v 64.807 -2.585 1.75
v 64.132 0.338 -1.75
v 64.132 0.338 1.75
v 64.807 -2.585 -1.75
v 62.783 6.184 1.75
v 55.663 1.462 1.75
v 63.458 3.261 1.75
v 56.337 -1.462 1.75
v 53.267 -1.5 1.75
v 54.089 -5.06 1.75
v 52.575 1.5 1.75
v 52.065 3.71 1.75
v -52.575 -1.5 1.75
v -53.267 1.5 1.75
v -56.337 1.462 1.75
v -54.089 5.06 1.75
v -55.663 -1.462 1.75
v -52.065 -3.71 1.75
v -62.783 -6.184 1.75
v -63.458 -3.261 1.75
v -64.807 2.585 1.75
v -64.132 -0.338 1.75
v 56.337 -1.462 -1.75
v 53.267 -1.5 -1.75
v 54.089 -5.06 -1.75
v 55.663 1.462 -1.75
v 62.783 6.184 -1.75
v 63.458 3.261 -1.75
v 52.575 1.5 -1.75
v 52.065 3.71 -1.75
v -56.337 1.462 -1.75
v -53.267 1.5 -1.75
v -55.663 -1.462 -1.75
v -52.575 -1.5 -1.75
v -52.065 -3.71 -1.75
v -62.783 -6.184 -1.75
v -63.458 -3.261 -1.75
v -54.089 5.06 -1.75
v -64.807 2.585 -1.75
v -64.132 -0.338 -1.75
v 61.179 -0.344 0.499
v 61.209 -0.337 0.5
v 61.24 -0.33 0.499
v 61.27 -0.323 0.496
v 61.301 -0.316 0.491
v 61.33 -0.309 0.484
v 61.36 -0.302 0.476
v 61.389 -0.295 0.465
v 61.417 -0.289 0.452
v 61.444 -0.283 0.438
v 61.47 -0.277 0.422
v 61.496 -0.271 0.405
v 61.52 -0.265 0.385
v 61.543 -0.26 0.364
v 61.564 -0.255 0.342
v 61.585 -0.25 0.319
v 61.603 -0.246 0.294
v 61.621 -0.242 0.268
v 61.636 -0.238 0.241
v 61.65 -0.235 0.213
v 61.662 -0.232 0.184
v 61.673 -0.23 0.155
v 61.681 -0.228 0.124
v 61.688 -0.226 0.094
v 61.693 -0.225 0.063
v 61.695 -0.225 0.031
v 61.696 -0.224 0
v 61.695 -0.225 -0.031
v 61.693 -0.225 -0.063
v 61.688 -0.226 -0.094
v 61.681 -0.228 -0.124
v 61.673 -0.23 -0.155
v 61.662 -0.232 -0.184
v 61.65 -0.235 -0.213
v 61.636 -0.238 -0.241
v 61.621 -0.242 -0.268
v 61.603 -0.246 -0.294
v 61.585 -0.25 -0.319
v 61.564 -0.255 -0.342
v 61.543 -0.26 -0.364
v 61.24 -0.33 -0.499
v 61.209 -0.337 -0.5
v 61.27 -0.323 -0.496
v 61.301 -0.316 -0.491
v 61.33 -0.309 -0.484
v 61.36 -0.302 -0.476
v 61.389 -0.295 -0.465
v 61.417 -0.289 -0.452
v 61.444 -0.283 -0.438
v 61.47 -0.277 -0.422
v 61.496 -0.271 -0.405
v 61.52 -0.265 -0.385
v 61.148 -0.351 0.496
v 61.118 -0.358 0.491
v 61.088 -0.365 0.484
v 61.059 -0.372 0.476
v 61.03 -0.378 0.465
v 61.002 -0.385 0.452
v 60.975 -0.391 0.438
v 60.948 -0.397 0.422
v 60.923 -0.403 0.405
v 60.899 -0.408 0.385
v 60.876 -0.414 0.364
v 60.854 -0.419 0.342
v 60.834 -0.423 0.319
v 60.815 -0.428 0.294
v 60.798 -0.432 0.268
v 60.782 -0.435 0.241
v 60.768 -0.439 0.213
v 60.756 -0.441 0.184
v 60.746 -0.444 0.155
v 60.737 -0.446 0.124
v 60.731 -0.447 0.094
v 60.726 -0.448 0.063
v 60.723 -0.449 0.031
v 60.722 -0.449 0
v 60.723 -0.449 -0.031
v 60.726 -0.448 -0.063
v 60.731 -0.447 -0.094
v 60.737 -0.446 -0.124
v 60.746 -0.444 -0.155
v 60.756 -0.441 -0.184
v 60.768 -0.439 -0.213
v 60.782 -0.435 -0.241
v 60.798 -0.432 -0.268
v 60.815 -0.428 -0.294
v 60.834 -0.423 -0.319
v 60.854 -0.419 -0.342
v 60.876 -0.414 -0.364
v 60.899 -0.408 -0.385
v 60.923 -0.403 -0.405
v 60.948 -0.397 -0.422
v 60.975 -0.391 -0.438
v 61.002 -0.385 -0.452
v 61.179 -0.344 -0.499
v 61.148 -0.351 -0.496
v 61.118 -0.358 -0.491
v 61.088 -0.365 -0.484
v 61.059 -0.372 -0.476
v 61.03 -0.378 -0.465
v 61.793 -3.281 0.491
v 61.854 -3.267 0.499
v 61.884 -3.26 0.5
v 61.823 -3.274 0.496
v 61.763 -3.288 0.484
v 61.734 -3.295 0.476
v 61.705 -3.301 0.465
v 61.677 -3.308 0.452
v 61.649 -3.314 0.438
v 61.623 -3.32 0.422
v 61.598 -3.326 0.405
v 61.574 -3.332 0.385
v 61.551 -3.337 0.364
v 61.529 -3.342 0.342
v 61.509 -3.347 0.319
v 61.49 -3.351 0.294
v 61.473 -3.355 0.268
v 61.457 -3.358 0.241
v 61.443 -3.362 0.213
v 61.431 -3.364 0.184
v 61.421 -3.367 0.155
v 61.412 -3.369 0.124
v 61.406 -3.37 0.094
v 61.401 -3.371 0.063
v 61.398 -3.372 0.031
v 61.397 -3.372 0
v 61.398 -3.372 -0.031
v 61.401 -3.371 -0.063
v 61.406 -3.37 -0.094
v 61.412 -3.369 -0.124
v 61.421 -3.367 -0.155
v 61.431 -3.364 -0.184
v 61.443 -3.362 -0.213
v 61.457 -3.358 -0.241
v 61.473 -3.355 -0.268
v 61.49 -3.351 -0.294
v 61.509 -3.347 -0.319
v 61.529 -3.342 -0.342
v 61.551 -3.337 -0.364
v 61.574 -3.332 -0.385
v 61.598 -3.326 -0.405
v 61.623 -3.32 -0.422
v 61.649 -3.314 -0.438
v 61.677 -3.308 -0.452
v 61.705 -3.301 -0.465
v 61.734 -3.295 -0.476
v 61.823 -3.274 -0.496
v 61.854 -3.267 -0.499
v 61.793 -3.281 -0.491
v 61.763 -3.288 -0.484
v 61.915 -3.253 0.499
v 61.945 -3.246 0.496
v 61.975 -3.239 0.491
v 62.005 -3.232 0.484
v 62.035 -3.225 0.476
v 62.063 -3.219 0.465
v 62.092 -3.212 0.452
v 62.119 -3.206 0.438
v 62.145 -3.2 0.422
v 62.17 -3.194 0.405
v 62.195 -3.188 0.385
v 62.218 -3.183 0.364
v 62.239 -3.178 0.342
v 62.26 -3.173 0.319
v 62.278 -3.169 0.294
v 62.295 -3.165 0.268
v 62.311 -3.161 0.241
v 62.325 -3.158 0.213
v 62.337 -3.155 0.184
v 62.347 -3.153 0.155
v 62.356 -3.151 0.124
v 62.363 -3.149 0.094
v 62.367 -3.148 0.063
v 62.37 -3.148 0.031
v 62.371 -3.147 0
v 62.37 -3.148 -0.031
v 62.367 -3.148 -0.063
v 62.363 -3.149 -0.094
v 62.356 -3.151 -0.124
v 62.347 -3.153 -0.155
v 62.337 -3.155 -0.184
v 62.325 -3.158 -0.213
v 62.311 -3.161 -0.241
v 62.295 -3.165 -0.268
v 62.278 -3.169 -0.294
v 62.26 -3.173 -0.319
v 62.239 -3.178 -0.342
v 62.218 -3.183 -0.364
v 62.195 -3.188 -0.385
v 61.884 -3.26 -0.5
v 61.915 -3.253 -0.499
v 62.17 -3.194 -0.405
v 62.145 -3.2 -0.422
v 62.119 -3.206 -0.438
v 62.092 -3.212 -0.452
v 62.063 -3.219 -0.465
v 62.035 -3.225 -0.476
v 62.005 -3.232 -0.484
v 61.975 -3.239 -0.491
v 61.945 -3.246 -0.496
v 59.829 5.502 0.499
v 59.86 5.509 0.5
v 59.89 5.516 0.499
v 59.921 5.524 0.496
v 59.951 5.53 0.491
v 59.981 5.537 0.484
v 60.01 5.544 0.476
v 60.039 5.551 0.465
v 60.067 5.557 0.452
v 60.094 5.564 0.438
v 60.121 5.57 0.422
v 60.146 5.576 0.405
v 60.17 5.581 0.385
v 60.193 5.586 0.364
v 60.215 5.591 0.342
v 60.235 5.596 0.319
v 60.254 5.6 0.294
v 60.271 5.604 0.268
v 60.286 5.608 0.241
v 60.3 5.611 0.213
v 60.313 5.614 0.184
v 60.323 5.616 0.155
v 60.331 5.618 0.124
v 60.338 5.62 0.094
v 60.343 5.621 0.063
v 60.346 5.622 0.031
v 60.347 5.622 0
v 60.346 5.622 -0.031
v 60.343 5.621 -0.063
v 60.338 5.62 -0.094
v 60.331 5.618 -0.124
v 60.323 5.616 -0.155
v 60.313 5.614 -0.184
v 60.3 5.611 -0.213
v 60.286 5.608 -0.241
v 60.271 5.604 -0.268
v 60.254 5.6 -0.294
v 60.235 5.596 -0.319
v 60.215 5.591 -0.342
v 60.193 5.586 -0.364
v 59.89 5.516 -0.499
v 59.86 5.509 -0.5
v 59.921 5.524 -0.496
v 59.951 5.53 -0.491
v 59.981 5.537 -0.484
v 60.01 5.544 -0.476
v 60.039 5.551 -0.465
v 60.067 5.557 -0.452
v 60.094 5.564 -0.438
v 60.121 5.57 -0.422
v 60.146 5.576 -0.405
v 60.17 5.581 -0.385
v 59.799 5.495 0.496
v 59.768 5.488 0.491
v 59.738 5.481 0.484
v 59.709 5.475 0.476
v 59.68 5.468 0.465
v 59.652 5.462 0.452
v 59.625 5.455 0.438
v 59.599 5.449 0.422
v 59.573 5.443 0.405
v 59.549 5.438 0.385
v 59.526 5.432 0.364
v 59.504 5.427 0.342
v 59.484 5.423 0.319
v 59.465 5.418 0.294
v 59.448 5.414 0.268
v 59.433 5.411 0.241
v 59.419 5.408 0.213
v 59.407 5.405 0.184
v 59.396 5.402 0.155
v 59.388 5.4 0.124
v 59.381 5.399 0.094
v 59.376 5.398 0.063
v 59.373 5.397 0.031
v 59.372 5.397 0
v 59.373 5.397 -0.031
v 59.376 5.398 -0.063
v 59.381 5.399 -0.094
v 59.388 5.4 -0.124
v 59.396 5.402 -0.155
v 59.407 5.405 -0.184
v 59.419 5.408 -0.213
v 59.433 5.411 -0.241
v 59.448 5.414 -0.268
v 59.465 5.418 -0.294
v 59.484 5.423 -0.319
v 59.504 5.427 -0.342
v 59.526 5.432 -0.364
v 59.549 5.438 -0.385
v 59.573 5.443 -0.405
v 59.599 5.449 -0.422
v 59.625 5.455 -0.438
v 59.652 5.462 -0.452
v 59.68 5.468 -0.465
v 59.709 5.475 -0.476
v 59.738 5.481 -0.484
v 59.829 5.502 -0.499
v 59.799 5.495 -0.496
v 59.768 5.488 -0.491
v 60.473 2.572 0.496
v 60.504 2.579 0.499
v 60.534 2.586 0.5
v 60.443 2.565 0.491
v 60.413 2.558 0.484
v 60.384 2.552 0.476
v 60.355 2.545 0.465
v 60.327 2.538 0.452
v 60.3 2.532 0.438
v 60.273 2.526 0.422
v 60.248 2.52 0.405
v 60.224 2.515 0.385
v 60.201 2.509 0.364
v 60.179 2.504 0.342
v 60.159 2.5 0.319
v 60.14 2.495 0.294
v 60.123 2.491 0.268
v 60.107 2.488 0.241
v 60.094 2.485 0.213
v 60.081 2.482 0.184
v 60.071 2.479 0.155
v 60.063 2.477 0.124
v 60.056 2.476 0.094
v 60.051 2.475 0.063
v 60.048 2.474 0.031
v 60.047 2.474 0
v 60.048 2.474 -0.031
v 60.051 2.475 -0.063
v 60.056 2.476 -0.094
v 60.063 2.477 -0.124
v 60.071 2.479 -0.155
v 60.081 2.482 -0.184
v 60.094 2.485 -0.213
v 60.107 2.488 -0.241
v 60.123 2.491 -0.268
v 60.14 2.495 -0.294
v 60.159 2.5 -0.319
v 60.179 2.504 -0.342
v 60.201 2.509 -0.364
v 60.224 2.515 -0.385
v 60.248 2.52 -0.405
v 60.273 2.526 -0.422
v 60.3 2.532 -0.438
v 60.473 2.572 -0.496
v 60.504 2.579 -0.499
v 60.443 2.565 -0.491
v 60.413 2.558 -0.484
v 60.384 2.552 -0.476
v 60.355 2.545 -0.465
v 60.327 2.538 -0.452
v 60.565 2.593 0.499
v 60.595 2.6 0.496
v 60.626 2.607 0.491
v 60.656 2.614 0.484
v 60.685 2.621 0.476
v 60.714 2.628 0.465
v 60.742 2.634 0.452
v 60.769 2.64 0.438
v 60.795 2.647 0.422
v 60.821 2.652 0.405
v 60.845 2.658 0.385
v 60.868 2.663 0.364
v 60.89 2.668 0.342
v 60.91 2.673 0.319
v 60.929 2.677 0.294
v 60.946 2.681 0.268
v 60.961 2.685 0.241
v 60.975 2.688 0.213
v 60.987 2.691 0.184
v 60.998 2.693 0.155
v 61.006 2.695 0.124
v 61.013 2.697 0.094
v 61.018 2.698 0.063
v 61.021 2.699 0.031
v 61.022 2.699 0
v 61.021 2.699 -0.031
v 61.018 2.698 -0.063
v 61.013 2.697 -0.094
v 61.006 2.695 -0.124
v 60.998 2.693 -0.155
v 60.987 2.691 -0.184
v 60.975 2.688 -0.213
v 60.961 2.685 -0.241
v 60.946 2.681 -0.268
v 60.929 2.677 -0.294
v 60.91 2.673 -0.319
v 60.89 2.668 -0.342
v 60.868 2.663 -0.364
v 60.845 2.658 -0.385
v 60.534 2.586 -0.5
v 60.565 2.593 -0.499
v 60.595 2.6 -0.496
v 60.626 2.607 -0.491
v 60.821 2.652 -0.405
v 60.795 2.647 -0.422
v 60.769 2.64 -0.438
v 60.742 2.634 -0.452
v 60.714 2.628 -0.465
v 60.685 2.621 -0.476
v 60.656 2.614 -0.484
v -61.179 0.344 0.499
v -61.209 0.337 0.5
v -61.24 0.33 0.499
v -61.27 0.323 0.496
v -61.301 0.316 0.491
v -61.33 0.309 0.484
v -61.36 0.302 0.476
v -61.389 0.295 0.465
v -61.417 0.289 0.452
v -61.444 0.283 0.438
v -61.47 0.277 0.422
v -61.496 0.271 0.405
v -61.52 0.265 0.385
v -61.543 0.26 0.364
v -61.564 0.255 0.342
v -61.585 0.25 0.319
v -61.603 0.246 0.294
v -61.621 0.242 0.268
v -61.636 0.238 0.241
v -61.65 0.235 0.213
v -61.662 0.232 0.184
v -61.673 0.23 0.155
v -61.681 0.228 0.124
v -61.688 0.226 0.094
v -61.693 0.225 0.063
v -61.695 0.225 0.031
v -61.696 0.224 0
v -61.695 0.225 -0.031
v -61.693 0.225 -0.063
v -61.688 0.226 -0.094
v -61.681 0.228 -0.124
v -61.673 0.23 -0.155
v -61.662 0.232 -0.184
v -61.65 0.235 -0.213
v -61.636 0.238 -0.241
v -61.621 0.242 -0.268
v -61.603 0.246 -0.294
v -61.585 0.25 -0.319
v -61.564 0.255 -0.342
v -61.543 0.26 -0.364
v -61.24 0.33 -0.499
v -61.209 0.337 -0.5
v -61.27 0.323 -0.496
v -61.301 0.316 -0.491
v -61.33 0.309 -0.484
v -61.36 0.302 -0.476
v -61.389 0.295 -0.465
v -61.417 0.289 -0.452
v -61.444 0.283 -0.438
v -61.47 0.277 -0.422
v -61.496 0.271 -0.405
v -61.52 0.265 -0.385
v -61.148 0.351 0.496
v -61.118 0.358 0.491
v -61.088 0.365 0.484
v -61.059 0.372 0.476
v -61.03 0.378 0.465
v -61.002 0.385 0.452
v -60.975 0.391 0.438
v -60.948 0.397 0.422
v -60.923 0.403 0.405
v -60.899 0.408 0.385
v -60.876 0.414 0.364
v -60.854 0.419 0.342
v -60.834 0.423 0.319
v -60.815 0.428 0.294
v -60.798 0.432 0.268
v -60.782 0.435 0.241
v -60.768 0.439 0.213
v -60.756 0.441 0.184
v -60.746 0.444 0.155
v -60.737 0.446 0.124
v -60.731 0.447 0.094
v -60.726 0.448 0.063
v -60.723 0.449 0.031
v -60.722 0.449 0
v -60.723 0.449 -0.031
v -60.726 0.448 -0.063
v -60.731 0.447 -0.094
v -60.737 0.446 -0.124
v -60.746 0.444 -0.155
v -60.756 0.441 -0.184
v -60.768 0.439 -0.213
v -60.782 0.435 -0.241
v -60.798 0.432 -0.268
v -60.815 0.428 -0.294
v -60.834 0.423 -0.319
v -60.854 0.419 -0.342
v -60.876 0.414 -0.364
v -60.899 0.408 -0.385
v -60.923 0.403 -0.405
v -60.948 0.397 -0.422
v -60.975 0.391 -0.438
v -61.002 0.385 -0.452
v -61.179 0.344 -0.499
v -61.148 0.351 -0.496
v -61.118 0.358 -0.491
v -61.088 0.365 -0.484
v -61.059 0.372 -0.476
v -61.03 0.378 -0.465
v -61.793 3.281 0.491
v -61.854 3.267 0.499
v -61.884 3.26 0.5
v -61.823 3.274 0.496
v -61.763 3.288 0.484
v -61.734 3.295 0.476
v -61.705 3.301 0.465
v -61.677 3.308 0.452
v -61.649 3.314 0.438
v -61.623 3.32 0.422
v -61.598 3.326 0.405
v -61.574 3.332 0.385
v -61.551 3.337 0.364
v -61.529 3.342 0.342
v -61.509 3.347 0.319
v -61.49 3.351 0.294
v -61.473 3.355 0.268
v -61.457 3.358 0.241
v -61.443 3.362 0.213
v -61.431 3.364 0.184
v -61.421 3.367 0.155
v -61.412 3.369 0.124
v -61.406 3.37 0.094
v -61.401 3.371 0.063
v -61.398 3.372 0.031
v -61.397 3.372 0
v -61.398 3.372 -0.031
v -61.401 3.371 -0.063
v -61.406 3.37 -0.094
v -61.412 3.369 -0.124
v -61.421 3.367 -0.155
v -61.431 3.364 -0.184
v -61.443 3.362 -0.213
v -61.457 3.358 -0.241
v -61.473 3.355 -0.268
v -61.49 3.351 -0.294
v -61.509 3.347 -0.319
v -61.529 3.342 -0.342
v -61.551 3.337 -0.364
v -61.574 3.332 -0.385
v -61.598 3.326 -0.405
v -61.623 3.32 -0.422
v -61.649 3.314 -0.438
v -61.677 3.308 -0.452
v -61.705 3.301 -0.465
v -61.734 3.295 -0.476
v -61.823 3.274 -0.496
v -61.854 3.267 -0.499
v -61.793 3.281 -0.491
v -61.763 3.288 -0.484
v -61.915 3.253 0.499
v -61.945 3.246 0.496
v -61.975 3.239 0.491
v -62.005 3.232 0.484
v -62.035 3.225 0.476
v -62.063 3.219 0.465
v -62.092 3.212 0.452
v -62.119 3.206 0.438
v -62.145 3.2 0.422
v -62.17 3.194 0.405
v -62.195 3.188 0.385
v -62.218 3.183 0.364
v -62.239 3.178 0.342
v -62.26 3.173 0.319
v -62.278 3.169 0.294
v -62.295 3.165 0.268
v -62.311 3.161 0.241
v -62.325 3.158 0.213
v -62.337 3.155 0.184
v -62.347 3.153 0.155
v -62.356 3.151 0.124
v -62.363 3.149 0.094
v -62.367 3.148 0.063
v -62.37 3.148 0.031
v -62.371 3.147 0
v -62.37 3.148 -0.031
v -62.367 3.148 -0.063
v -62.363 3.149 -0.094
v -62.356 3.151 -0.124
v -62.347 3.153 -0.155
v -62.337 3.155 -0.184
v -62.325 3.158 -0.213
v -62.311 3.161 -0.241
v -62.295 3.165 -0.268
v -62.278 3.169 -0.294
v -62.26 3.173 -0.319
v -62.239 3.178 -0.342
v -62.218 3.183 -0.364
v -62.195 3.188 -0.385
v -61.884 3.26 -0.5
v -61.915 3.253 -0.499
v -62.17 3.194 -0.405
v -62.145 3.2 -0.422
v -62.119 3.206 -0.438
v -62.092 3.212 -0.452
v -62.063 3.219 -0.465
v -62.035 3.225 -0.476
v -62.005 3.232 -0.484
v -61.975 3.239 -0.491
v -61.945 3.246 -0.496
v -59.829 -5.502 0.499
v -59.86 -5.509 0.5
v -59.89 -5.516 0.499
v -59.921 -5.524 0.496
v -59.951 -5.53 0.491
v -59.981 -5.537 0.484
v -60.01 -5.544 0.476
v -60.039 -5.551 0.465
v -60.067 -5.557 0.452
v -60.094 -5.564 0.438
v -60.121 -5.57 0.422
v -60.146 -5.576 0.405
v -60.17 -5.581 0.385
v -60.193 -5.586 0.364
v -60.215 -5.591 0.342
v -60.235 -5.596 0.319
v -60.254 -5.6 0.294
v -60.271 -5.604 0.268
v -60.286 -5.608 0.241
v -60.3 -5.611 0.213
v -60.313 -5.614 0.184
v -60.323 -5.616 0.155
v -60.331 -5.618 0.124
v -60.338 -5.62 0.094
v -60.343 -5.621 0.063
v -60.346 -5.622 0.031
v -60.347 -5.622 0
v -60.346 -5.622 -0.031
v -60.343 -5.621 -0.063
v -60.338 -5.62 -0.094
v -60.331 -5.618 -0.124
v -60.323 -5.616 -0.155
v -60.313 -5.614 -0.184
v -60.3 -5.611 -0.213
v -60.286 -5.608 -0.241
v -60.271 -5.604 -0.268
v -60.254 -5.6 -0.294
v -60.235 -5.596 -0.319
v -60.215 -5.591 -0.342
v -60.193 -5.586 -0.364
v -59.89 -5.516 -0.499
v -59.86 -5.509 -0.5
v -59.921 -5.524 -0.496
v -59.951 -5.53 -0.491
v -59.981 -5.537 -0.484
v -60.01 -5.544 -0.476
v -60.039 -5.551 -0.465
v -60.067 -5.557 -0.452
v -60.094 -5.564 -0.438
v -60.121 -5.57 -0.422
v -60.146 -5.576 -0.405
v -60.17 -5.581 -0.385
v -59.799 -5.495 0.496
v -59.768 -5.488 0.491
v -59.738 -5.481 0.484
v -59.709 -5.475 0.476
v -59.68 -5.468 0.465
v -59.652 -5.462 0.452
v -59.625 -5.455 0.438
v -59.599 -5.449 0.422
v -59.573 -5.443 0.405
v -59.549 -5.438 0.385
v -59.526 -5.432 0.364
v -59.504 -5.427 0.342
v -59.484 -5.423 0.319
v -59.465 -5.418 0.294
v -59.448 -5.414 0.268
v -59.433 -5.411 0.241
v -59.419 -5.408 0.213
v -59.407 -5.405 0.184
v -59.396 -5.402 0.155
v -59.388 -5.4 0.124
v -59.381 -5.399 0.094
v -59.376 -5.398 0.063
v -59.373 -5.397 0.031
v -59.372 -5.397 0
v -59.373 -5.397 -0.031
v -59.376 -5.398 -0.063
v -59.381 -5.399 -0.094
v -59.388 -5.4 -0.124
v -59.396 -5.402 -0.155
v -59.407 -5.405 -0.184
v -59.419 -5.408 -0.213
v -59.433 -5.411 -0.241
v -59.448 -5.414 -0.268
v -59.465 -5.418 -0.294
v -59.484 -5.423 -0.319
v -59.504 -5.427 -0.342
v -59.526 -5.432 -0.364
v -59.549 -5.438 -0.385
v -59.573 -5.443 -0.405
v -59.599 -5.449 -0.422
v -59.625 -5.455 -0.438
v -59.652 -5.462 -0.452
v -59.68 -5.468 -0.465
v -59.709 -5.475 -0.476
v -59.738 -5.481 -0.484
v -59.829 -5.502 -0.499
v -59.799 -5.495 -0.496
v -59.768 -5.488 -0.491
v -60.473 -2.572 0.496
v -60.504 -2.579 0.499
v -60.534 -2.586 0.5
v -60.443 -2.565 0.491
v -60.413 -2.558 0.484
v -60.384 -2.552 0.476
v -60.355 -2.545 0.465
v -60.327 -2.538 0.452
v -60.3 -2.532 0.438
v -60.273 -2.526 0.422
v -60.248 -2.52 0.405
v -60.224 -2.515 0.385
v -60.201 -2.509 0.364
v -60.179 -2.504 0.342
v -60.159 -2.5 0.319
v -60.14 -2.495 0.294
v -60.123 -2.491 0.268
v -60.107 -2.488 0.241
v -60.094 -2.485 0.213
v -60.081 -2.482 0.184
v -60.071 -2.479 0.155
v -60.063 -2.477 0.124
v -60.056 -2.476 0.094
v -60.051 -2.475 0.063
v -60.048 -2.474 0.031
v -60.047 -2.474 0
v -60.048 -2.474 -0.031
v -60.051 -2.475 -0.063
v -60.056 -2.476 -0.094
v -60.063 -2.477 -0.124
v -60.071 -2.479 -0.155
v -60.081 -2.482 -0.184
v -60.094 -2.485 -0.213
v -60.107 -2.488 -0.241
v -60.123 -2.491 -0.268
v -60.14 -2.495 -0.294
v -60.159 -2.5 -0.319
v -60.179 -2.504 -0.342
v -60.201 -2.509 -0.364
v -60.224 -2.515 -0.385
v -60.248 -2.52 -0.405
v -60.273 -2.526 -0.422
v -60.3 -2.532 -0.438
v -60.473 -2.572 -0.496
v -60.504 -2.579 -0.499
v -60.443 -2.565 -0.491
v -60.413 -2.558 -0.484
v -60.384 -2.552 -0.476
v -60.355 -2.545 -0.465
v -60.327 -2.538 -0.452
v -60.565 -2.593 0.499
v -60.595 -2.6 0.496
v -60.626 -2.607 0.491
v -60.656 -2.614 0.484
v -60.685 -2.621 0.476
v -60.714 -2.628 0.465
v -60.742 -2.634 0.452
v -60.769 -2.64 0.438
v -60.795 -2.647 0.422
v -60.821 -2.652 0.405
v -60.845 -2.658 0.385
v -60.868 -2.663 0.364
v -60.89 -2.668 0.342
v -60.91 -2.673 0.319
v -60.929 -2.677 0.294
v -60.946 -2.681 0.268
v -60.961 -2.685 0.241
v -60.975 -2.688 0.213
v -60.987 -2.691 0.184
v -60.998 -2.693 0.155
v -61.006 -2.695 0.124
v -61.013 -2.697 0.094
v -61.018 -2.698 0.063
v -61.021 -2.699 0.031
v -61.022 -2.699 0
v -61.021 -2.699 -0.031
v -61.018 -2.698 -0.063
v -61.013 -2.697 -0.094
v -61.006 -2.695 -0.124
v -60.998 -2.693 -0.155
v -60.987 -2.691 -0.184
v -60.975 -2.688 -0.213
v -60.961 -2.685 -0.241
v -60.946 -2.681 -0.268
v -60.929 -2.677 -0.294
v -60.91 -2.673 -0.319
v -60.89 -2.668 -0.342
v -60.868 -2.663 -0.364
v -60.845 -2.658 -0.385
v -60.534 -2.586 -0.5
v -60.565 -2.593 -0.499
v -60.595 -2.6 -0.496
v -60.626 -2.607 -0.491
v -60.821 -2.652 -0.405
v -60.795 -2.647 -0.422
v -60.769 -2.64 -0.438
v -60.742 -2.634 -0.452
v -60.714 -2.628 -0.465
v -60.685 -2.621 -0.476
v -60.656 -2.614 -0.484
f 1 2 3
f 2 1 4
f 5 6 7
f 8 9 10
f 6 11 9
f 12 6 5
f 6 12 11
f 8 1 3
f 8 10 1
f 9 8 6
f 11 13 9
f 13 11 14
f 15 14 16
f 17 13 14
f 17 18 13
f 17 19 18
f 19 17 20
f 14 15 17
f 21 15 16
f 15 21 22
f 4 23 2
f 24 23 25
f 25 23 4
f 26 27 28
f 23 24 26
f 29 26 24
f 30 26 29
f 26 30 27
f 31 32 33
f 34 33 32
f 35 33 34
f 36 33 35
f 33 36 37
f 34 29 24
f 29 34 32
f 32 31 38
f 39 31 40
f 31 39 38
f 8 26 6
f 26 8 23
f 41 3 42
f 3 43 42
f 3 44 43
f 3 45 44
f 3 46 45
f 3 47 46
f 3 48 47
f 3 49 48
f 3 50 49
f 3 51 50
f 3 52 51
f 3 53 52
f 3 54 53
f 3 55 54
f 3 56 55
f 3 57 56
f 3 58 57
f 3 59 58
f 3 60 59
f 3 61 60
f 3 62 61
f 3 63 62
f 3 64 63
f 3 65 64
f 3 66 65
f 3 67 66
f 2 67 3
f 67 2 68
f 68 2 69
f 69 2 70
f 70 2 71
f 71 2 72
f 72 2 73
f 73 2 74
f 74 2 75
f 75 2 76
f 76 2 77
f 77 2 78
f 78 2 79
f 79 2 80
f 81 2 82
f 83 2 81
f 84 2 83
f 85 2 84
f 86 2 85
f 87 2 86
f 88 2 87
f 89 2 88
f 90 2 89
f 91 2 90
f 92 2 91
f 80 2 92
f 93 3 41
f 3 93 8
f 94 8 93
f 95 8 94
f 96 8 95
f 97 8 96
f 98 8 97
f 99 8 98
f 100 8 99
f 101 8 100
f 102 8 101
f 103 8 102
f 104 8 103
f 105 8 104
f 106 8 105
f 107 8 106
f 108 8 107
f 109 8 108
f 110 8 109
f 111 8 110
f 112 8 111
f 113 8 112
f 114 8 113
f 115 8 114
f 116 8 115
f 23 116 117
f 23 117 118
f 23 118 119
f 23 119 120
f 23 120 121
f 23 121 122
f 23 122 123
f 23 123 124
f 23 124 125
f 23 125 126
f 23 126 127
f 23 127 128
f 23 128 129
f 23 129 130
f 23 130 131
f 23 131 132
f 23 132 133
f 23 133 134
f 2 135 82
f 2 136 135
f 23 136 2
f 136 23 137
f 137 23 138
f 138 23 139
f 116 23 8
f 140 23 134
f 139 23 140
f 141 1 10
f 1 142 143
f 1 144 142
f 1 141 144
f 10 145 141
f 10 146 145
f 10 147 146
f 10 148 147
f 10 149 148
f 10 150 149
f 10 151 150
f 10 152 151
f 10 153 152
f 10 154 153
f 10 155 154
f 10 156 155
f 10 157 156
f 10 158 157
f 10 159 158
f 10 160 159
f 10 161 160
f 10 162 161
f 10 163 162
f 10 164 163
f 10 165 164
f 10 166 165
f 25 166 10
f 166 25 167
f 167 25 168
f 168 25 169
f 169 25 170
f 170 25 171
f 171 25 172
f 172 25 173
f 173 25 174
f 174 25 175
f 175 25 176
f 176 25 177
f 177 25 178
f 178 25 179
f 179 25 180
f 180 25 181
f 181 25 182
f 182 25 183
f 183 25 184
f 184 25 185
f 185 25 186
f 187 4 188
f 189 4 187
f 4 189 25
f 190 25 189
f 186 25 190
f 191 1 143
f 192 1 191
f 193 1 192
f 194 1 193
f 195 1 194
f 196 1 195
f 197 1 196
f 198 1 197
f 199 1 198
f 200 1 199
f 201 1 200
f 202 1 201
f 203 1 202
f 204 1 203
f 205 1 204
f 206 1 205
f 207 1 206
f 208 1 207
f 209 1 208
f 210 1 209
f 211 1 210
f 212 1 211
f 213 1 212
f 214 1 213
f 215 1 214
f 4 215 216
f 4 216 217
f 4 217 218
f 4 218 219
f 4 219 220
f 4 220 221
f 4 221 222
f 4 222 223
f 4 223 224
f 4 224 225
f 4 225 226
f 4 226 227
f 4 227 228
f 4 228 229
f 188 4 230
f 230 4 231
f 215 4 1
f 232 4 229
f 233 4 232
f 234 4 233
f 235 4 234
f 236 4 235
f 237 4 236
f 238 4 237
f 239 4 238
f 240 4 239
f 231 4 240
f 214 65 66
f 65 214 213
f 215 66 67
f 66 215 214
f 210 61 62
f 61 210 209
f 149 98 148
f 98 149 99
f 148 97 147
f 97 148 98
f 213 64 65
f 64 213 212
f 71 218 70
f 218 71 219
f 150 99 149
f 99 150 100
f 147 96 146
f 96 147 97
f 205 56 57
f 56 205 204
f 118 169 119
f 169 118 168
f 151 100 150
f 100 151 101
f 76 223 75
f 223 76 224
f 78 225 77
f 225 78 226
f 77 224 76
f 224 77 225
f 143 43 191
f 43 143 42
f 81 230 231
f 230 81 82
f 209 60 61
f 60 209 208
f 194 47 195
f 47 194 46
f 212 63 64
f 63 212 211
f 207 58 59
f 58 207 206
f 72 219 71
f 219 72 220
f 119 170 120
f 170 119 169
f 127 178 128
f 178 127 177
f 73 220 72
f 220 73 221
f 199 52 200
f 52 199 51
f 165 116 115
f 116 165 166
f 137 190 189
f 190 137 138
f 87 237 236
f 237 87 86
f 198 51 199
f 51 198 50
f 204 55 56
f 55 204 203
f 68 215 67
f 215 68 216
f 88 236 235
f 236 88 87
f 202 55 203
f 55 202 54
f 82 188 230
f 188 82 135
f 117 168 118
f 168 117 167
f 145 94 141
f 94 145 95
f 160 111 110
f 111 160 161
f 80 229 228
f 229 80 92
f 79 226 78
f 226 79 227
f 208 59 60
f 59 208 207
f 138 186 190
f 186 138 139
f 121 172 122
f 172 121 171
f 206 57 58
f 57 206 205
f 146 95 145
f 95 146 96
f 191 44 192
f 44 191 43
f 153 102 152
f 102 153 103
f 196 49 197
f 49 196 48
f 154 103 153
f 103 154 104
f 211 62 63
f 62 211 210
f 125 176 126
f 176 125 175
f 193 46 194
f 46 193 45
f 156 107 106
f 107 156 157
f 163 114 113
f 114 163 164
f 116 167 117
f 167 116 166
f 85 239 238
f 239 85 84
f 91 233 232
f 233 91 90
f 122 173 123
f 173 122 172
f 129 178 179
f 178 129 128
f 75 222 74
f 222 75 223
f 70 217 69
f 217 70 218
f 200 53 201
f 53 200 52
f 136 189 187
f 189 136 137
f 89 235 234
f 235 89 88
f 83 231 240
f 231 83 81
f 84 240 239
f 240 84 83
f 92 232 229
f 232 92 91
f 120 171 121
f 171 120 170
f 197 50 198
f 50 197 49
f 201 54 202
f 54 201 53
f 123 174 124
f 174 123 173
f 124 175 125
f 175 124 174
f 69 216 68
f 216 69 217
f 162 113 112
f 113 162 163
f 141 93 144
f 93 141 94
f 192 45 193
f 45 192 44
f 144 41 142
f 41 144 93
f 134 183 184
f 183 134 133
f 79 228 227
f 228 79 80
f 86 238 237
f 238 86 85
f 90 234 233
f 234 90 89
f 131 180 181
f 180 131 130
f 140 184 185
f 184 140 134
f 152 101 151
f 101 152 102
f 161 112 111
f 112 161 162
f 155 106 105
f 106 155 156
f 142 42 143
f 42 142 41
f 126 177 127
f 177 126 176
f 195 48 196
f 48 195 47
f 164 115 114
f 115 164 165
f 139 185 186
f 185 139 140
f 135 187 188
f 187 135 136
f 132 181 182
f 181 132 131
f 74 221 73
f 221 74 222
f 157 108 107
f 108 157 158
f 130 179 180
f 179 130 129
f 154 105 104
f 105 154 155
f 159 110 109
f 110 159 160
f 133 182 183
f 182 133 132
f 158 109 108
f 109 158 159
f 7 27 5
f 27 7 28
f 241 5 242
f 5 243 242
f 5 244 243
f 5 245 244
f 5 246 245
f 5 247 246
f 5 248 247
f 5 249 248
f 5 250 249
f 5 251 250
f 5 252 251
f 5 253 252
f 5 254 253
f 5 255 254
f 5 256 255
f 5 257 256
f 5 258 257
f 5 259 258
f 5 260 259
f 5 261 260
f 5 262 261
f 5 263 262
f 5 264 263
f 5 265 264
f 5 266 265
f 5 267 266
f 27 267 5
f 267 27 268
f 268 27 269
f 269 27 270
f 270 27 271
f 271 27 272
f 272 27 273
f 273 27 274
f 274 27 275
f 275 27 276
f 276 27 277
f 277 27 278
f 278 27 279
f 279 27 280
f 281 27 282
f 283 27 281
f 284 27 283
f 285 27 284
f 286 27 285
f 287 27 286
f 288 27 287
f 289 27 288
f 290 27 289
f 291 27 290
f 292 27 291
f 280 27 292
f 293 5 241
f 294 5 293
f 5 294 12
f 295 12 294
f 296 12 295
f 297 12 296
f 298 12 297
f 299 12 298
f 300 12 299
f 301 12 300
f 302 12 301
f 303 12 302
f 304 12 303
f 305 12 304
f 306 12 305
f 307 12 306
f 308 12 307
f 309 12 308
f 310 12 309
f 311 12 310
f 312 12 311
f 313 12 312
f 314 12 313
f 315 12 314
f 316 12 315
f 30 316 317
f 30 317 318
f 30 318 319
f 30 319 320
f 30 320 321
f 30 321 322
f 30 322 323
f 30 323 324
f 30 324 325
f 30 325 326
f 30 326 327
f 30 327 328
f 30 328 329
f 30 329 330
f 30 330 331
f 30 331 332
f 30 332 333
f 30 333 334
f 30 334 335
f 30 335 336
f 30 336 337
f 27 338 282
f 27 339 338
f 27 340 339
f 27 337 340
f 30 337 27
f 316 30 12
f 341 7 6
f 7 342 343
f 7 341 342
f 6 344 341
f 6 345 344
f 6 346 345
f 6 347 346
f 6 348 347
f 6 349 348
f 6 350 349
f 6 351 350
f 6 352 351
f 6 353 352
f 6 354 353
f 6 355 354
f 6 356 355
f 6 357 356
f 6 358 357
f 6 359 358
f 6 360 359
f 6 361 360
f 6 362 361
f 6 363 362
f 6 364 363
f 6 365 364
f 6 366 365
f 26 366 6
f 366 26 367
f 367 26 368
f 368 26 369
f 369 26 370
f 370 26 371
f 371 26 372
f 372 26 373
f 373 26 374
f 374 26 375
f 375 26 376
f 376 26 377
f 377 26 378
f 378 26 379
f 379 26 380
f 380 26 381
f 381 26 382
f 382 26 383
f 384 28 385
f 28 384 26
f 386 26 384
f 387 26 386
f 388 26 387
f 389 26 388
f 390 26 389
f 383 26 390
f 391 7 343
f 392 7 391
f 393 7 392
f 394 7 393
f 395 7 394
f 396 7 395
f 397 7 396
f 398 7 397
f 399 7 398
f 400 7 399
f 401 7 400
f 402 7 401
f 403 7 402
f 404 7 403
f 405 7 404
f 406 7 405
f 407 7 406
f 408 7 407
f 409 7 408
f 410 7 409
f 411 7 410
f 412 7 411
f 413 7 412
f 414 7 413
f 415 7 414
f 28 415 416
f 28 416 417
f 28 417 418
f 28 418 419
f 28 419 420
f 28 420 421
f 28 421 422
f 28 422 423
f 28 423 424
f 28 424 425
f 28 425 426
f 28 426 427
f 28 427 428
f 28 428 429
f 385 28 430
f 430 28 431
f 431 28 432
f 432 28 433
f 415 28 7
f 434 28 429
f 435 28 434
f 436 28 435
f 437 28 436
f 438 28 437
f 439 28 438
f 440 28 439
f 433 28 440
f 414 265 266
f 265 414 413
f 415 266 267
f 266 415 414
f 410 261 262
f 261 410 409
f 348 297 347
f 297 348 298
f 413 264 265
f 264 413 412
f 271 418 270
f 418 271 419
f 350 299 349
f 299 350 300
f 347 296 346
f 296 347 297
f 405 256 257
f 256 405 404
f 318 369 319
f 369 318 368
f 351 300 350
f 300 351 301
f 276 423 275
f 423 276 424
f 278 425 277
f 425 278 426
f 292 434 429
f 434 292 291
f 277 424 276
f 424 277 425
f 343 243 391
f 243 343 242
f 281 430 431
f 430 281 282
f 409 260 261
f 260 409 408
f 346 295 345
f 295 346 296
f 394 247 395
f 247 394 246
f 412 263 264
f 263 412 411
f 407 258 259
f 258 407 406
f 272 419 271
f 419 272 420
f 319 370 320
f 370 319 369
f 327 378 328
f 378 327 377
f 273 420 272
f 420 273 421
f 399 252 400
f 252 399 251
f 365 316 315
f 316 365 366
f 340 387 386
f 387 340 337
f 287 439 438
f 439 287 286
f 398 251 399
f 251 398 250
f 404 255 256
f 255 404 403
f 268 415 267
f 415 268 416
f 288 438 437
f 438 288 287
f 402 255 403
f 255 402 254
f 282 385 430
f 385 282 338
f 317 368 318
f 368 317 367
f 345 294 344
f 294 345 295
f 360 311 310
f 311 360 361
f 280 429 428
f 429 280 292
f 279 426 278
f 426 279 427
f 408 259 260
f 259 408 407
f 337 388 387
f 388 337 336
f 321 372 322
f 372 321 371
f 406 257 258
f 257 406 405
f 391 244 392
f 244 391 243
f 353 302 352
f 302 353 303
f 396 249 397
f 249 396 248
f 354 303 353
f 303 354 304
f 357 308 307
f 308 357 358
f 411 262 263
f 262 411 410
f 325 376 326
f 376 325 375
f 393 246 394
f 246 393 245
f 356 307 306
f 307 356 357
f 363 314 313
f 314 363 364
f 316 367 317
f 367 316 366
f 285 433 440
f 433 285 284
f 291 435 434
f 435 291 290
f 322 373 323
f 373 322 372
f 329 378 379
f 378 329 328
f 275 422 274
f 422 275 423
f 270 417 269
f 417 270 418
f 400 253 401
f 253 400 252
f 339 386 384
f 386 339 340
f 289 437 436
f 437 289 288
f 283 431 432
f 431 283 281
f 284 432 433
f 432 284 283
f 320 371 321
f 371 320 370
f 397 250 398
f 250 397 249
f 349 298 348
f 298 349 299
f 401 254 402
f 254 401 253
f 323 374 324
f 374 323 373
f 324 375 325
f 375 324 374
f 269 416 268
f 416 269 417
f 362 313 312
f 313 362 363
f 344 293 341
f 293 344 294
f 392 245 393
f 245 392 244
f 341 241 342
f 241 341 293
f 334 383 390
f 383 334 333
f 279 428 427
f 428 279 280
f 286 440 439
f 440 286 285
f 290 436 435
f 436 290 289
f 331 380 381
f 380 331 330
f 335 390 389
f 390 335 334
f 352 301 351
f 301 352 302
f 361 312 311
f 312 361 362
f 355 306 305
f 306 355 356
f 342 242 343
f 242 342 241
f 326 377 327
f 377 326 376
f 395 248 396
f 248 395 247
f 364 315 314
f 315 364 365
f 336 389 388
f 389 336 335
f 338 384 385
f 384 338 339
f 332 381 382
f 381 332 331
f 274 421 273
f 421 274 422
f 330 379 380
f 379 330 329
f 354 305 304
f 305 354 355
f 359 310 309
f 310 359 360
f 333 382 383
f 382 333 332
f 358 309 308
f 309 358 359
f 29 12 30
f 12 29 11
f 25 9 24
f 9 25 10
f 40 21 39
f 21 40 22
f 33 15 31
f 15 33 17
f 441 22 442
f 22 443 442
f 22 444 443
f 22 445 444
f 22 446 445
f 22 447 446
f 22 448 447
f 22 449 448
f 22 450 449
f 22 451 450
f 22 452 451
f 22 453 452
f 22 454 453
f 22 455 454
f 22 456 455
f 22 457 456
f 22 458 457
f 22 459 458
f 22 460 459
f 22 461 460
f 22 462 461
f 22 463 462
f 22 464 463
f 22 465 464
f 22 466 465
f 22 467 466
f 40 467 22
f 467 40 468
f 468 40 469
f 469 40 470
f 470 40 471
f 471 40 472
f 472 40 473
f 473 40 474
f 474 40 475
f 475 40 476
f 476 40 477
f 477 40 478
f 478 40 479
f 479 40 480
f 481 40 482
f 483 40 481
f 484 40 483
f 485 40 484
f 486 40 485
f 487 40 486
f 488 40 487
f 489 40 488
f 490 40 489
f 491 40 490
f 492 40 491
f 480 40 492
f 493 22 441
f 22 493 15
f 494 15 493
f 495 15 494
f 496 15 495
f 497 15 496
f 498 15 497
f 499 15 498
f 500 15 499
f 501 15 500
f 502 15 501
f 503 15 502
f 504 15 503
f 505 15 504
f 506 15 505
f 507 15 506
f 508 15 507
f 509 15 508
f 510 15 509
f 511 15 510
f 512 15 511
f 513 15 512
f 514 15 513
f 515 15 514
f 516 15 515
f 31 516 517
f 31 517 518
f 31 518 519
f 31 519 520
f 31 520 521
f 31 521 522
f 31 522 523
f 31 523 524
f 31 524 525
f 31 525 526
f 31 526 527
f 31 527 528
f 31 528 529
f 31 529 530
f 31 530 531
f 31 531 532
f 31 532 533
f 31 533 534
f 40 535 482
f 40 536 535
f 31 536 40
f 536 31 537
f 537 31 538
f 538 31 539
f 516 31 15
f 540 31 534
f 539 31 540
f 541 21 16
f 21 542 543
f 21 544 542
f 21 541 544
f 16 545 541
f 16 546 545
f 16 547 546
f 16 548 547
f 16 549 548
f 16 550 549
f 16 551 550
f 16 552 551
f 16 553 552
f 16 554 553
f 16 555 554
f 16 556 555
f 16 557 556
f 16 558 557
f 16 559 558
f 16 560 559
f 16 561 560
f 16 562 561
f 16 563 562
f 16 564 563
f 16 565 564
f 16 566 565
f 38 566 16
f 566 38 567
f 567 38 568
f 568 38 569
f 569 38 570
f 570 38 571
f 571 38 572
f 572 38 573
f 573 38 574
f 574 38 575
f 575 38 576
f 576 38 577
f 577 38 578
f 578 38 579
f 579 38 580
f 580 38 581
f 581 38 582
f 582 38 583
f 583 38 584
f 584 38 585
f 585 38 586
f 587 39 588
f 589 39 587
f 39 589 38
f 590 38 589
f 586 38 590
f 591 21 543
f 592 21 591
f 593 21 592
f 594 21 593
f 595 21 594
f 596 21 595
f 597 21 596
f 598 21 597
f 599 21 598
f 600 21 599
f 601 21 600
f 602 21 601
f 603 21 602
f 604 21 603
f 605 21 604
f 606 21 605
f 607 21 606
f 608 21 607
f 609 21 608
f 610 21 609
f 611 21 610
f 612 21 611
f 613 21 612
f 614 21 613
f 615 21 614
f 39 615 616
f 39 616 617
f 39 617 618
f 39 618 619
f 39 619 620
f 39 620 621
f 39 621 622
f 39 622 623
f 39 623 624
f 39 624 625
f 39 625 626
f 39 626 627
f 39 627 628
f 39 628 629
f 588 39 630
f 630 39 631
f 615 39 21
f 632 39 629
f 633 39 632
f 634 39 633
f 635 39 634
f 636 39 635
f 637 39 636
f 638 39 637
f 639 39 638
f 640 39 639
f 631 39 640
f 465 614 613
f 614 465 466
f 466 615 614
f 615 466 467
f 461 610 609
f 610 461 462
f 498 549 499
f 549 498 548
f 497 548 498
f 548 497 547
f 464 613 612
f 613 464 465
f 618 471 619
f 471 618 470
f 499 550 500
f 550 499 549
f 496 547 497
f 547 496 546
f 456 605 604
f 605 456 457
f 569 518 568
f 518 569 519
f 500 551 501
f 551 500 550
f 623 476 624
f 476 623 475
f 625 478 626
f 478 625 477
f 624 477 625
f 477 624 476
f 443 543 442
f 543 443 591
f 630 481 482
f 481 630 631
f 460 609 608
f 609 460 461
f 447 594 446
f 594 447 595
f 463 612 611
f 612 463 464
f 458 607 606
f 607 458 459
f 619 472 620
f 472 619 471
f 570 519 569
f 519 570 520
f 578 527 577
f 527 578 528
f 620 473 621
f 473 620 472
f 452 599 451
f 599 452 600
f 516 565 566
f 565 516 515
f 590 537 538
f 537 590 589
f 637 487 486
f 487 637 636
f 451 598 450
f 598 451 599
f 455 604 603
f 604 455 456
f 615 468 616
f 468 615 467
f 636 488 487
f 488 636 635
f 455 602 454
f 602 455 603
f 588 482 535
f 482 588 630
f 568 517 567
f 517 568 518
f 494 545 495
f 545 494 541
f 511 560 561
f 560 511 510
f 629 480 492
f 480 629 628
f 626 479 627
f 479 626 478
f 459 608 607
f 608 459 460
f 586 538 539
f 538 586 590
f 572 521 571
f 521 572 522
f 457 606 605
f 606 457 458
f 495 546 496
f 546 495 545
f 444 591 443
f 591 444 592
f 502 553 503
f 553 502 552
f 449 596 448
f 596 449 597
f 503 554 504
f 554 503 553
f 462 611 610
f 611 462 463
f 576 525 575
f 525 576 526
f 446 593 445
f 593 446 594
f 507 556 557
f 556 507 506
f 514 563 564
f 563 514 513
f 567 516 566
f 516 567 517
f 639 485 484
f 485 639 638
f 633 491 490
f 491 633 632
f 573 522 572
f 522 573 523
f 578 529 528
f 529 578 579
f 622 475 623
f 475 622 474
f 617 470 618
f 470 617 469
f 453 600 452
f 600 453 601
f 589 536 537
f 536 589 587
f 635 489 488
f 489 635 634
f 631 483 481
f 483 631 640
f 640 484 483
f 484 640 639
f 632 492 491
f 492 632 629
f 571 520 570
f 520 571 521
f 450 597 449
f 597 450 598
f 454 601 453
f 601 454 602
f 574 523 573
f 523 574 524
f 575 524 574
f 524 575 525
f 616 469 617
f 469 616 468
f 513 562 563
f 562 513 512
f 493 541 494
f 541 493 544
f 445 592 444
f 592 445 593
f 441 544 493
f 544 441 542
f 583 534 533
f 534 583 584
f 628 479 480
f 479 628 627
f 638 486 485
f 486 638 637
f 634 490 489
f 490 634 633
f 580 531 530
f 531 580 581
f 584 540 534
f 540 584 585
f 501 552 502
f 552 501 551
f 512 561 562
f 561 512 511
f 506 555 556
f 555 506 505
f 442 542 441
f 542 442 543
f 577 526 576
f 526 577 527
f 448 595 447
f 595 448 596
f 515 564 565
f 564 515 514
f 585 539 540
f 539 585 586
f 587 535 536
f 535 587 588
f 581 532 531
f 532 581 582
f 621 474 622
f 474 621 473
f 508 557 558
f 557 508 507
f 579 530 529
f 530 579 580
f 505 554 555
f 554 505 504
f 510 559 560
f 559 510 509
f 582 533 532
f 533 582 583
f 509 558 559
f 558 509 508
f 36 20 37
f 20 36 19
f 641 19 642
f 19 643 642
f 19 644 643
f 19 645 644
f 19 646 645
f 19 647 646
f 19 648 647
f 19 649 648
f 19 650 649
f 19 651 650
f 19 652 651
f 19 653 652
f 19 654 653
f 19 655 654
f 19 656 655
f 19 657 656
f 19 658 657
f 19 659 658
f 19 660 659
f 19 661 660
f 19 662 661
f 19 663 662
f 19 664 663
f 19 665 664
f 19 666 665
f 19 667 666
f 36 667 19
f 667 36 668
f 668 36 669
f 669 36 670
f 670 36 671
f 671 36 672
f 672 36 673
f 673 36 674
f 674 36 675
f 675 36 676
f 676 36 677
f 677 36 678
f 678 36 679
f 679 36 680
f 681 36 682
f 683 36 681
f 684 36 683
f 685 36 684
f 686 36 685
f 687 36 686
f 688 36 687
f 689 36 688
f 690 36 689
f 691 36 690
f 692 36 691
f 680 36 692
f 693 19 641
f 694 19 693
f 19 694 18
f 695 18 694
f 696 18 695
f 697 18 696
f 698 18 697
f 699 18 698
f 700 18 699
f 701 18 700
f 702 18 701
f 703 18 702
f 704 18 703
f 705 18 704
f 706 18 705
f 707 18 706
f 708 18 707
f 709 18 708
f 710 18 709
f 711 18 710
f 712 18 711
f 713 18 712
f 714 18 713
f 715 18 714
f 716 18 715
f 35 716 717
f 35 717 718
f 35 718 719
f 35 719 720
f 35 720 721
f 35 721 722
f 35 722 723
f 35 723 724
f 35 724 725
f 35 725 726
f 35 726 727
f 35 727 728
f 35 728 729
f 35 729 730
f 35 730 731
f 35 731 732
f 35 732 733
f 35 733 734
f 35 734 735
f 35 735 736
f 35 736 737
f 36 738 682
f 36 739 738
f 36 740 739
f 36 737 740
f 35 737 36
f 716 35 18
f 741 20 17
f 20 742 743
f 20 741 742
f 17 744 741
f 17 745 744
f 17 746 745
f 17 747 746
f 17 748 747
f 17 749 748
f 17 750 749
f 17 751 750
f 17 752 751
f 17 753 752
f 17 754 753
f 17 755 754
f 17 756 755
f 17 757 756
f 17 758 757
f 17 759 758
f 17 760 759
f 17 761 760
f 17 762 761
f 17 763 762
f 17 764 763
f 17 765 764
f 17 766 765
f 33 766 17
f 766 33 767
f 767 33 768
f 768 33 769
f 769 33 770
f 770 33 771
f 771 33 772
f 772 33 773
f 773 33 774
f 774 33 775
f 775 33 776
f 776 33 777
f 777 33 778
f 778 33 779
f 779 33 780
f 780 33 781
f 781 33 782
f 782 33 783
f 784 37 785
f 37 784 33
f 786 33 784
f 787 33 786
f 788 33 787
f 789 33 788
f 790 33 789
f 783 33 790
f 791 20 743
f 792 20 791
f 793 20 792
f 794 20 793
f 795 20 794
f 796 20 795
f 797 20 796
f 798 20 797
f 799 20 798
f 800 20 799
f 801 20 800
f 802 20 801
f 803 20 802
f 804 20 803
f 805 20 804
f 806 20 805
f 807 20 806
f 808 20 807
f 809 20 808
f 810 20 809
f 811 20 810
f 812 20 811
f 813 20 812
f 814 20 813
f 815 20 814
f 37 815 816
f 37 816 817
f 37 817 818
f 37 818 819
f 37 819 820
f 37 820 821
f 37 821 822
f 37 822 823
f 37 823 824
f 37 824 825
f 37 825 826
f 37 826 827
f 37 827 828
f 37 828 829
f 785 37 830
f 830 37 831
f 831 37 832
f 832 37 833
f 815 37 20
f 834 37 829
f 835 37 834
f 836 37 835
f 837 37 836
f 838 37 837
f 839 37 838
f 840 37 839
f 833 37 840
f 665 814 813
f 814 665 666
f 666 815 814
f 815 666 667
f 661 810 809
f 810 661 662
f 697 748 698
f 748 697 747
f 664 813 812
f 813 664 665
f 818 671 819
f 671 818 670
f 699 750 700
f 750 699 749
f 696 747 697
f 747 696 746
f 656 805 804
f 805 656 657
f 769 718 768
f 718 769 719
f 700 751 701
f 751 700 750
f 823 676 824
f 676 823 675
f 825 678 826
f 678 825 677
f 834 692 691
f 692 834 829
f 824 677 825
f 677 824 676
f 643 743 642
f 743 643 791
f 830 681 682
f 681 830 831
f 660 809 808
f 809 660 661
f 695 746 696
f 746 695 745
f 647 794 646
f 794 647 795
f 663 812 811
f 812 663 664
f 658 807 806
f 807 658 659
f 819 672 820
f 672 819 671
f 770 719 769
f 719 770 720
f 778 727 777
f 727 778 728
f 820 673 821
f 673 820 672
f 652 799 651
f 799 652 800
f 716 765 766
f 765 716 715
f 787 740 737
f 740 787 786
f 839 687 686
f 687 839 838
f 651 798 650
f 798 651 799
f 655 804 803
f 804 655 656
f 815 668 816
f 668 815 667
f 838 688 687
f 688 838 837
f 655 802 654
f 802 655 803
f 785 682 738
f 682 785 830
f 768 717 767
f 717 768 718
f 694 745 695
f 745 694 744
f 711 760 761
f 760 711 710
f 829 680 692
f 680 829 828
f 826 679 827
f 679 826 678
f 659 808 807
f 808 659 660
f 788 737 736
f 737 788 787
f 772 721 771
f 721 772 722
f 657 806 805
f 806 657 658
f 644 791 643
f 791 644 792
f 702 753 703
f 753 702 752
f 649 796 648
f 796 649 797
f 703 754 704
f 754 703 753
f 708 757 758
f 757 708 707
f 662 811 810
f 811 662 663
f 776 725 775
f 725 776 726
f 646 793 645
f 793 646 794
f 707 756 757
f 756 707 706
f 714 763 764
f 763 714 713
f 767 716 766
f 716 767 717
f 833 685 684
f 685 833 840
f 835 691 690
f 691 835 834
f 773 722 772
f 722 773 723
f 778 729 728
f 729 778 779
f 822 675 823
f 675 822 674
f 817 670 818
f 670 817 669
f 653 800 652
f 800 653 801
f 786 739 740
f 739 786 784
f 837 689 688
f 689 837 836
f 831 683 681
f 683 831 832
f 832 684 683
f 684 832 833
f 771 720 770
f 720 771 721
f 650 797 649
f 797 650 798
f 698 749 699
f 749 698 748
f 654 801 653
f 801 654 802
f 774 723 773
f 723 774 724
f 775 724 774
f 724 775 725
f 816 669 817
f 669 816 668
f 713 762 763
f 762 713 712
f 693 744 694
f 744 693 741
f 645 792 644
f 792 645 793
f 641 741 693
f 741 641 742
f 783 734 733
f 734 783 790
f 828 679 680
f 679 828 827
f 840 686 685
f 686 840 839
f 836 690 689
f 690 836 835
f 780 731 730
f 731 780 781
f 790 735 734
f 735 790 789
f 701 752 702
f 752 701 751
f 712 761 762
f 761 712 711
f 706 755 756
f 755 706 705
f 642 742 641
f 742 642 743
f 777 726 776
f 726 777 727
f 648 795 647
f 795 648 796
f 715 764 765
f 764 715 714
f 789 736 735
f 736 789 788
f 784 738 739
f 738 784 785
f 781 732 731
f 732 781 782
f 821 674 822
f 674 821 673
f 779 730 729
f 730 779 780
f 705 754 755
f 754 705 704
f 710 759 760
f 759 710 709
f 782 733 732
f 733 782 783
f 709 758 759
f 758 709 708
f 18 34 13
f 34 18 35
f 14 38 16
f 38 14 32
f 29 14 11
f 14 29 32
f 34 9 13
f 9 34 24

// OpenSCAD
$fs = 0.01;
$fn = 100;

length = 122;

angle = 13;

thick = 3;
height = 3.5;
space = 5;
hole_diam = 1;

module claw()
{
    translate([-thick/2,0,0])
    cube([thick, 3*thick, height], true);

    for (sign = [-1,1])
    {
        difference()
        {
            x = space+thick;
            y = sign*thick;
            color("green")
            translate([x/2,y,0])
            cube([x,thick,height], true);

            color("red")
            translate([space,y,0])
            rotate(90, [1,0,0])
            cylinder(thick+$fs, hole_diam/2,hole_diam/2, true);
        }
    }
}

color("blue")
cube([length-thick-2*space,thick,height], true);

for (rot = [0,180])
{
    rotate(rot,[0,0,1])
    translate([length/2-space, 0, 0])
    rotate(angle,[0,0,1])
    claw();
}
